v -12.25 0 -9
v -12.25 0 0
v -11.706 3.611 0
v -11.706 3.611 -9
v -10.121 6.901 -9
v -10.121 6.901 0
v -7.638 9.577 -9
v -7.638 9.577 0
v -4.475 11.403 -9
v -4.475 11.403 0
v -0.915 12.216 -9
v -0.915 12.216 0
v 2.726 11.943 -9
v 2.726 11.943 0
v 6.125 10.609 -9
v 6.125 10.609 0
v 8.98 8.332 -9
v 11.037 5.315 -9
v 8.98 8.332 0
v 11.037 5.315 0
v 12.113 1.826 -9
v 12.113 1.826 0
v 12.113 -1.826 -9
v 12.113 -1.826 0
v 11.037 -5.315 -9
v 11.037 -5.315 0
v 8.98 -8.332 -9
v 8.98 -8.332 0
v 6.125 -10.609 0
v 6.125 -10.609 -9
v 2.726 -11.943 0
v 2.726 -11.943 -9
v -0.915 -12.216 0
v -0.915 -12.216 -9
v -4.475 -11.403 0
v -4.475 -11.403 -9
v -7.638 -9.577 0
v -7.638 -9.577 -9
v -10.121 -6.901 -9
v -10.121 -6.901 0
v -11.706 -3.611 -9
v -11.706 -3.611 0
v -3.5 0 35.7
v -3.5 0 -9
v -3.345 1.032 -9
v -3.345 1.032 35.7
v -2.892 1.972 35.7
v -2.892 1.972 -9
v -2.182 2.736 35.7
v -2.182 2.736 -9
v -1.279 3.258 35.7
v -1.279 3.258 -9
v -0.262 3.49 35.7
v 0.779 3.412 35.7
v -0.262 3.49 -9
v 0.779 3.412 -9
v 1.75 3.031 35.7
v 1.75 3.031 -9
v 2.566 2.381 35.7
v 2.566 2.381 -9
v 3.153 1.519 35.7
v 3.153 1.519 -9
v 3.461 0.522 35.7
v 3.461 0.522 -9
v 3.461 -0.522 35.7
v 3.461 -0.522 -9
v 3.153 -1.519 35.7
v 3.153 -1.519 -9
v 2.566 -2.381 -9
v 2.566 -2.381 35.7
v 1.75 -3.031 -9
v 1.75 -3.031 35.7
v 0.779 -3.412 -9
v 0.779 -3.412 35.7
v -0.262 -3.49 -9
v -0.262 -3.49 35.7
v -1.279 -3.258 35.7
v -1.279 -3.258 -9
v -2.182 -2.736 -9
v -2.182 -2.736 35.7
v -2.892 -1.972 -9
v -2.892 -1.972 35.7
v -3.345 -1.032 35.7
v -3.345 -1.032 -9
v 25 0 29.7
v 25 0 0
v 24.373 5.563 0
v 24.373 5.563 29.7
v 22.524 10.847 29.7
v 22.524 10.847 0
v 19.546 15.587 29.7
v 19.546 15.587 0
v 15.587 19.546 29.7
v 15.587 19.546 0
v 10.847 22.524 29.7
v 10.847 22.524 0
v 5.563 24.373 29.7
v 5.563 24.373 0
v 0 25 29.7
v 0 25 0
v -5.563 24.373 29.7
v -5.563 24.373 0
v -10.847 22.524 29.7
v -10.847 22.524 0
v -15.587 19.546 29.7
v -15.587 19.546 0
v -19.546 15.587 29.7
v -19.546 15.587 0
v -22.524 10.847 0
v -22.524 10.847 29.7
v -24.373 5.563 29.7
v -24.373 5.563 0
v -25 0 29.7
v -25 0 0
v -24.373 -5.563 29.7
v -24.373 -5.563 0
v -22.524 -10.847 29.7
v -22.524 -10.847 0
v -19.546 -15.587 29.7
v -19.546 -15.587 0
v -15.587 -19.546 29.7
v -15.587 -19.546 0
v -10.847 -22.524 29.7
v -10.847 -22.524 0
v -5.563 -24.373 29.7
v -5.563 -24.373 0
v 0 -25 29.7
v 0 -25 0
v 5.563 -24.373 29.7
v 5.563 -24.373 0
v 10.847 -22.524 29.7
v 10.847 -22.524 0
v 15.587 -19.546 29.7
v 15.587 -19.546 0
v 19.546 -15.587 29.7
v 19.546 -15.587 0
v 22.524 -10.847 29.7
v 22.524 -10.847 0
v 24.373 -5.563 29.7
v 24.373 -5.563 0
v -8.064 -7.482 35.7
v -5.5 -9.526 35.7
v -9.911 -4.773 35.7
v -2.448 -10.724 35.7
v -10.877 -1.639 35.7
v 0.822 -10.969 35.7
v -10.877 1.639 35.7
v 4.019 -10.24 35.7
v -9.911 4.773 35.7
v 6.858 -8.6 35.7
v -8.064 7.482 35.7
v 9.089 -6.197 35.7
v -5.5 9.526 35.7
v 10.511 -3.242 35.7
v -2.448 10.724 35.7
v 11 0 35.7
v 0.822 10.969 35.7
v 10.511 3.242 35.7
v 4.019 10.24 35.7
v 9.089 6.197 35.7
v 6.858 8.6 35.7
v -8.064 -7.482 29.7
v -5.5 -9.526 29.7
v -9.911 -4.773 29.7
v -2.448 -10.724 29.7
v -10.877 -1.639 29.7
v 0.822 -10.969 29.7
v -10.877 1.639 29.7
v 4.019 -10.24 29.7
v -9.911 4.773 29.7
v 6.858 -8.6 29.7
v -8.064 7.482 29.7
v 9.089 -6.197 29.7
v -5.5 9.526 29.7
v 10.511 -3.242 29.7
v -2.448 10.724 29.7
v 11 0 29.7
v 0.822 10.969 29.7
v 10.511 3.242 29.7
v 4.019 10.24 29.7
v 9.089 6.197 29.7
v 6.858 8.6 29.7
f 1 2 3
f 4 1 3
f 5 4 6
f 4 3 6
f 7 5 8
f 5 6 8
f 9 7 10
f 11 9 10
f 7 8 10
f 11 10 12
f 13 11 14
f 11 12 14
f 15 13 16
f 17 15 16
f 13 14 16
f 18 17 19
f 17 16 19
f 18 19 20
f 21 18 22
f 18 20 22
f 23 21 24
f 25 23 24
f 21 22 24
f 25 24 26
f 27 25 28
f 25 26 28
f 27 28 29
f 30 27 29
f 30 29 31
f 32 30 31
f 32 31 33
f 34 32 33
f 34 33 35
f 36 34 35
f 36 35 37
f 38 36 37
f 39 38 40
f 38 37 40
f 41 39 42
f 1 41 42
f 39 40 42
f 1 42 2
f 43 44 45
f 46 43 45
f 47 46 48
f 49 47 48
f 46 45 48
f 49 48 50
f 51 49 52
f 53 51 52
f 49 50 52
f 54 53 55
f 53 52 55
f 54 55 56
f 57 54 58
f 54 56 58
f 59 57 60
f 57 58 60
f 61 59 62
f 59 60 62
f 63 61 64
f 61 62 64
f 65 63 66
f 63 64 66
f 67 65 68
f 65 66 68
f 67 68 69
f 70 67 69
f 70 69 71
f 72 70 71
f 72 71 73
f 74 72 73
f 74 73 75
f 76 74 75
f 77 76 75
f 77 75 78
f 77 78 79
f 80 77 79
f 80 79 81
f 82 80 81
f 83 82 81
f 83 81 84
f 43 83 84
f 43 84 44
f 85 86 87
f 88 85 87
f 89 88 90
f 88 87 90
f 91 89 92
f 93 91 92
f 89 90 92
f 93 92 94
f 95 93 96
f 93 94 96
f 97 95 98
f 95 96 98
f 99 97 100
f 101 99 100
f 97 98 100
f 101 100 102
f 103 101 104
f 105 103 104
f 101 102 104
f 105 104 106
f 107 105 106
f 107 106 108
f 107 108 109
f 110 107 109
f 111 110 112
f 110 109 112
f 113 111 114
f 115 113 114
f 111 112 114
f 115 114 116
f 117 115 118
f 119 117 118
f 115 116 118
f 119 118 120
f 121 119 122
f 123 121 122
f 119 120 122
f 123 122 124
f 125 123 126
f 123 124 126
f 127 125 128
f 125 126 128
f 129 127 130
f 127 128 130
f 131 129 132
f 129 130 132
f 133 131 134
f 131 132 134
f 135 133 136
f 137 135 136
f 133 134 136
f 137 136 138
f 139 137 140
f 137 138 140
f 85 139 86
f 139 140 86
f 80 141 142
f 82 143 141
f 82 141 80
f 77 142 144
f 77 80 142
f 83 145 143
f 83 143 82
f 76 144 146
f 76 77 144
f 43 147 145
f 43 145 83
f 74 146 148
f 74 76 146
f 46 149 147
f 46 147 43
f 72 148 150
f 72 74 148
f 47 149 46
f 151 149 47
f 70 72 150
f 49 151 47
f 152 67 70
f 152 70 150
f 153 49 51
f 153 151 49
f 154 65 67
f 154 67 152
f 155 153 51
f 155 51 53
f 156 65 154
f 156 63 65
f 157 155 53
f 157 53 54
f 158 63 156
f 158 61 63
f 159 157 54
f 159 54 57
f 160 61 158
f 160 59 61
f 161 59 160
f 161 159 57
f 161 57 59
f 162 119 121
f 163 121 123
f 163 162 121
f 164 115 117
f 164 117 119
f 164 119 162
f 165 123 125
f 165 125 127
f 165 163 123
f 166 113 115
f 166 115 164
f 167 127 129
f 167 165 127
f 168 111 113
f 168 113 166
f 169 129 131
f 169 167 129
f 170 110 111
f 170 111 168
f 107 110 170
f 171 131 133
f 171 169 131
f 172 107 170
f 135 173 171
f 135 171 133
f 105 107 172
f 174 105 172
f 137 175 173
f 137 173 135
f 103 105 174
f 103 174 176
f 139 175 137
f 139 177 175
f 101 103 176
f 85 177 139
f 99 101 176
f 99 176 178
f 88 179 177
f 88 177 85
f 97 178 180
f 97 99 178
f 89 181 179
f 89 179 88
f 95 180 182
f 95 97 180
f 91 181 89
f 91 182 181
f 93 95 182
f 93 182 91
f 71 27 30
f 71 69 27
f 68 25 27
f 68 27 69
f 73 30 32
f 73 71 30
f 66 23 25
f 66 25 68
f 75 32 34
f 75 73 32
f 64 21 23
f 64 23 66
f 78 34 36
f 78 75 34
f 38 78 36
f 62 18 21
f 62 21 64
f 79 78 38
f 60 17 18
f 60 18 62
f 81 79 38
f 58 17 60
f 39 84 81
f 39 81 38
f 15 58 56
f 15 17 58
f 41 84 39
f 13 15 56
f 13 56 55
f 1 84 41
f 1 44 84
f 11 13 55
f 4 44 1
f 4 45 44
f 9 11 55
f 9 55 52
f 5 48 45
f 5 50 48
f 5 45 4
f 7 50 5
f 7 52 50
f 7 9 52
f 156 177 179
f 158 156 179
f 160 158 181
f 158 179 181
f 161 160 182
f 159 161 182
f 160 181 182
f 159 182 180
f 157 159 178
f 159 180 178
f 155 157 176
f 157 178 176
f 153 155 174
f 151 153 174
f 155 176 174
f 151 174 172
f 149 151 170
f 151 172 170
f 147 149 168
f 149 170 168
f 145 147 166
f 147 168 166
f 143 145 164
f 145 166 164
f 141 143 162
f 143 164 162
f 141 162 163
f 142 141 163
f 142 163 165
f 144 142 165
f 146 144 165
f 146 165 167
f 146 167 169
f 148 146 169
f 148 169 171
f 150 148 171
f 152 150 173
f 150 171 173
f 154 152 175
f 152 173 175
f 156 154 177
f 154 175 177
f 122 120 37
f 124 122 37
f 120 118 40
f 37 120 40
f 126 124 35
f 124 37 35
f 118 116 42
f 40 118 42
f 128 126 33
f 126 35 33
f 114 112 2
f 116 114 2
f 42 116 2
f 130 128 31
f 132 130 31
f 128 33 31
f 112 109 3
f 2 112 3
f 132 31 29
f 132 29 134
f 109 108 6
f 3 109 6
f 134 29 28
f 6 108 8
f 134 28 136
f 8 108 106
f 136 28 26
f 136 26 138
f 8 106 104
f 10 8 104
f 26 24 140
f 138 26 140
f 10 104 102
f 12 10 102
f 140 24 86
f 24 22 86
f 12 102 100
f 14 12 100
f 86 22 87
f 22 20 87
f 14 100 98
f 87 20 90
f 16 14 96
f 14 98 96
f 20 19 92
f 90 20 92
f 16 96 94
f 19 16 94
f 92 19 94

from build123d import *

# Parameters (mm, degrees)
SKETCH1_R           = 25
BOSS_EXTRUDE1_DEPTH = 29.7
SKETCH2_R           = 11
BOSS_EXTRUDE2_DEPTH = 6
SKETCH3_R           = 12.25
BOSS_EXTRUDE3_DEPTH = 9
SKETCH4_R           = 3.5
CUT_EXTRUDE1_DEPTH  = 57.992016985


with BuildPart() as part:
    # Sketch1 → Boss-Extrude1 (new body)
    with BuildSketch(Plane.XY):
        Circle(SKETCH1_R)
    extrude(amount=BOSS_EXTRUDE1_DEPTH)

    # Sketch2 → Boss-Extrude2 (add)
    with BuildSketch(Plane.XY.offset(29.7)):
        Circle(SKETCH2_R)
    extrude(amount=BOSS_EXTRUDE2_DEPTH)

    # Sketch3 → Boss-Extrude3 (add)
    with BuildSketch(Plane(origin=(0, 0, 0), x_dir=(-1, 0, 0), z_dir=(0, 0, -1))):
        Circle(SKETCH3_R)
    extrude(amount=BOSS_EXTRUDE3_DEPTH)

    # Sketch4 → Cut-Extrude1 (cut, through all)
    with BuildSketch(Plane(origin=(0, 0, -9), x_dir=(-1, 0, 0), z_dir=(0, 0, -1))):
        Circle(SKETCH4_R)
    extrude(amount=-CUT_EXTRUDE1_DEPTH, mode=Mode.SUBTRACT)


solid = part.part
